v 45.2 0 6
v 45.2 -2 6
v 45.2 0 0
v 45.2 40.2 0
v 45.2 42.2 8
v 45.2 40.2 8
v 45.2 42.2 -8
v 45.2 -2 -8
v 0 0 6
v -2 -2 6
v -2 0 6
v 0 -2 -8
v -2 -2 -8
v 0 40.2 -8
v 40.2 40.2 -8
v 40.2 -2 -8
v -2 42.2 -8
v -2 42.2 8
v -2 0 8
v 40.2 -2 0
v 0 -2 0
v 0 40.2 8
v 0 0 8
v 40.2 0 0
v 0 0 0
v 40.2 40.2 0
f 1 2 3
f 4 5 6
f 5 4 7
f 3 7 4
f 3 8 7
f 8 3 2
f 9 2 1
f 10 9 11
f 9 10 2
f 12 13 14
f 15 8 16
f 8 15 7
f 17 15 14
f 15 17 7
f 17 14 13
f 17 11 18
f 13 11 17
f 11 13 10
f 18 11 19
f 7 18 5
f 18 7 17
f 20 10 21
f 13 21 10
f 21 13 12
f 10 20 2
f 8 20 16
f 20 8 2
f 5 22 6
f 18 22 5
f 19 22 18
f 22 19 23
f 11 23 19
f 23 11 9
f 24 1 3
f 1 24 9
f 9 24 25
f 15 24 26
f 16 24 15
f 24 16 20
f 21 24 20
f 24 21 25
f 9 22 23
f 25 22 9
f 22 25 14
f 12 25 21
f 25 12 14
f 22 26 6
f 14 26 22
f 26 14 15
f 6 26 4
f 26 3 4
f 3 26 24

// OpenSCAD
// haba block unit size 
unit=40;
// how much play your blocks should have.
tolerance=0.2;

// wall thickness
w=2;
// wall height
wh=8;
// wall height below track exits
wh_low=6;
// base plate offset, if > 0 the blocks will be lifted
// should be << wall size
// if == 0 you need left and right walls
offset=0;
// plate for the next brick to lay on
terrace=3;

// left wall (1 or 0, yes or no)
left = 1;
// right wall
right = 1;
// right wall support (1 or 0)
rws = 0;
// support distance
sd = 0.15;

// set the correct values from customizer settings
h=unit+tolerance;
lw=left*w;
rw=right*w;

difference() {
//clip
union() {
  translate([-w,-rw,-wh+offset/2])
  cube([h+2*w+terrace, h+lw+rw, wh+wh_low]);
  translate([-w,0,-wh+offset/2])
  cube([h+2*w+terrace, h+lw, 2*wh]);
}
//}
//track setup to be saved
union() {
translate([0,0,offset])
  cube([h,h,h]);
translate([0,-h,-h])
  cube([h,2*h,h]);
translate([h,0,0+offset])
  cube([2*h,h,h]);
}
}

//support under the right wall
translate([1,-rw,-wh])
cube([rws*(h-2),rws*rw,rws*(wh-sd)]);
